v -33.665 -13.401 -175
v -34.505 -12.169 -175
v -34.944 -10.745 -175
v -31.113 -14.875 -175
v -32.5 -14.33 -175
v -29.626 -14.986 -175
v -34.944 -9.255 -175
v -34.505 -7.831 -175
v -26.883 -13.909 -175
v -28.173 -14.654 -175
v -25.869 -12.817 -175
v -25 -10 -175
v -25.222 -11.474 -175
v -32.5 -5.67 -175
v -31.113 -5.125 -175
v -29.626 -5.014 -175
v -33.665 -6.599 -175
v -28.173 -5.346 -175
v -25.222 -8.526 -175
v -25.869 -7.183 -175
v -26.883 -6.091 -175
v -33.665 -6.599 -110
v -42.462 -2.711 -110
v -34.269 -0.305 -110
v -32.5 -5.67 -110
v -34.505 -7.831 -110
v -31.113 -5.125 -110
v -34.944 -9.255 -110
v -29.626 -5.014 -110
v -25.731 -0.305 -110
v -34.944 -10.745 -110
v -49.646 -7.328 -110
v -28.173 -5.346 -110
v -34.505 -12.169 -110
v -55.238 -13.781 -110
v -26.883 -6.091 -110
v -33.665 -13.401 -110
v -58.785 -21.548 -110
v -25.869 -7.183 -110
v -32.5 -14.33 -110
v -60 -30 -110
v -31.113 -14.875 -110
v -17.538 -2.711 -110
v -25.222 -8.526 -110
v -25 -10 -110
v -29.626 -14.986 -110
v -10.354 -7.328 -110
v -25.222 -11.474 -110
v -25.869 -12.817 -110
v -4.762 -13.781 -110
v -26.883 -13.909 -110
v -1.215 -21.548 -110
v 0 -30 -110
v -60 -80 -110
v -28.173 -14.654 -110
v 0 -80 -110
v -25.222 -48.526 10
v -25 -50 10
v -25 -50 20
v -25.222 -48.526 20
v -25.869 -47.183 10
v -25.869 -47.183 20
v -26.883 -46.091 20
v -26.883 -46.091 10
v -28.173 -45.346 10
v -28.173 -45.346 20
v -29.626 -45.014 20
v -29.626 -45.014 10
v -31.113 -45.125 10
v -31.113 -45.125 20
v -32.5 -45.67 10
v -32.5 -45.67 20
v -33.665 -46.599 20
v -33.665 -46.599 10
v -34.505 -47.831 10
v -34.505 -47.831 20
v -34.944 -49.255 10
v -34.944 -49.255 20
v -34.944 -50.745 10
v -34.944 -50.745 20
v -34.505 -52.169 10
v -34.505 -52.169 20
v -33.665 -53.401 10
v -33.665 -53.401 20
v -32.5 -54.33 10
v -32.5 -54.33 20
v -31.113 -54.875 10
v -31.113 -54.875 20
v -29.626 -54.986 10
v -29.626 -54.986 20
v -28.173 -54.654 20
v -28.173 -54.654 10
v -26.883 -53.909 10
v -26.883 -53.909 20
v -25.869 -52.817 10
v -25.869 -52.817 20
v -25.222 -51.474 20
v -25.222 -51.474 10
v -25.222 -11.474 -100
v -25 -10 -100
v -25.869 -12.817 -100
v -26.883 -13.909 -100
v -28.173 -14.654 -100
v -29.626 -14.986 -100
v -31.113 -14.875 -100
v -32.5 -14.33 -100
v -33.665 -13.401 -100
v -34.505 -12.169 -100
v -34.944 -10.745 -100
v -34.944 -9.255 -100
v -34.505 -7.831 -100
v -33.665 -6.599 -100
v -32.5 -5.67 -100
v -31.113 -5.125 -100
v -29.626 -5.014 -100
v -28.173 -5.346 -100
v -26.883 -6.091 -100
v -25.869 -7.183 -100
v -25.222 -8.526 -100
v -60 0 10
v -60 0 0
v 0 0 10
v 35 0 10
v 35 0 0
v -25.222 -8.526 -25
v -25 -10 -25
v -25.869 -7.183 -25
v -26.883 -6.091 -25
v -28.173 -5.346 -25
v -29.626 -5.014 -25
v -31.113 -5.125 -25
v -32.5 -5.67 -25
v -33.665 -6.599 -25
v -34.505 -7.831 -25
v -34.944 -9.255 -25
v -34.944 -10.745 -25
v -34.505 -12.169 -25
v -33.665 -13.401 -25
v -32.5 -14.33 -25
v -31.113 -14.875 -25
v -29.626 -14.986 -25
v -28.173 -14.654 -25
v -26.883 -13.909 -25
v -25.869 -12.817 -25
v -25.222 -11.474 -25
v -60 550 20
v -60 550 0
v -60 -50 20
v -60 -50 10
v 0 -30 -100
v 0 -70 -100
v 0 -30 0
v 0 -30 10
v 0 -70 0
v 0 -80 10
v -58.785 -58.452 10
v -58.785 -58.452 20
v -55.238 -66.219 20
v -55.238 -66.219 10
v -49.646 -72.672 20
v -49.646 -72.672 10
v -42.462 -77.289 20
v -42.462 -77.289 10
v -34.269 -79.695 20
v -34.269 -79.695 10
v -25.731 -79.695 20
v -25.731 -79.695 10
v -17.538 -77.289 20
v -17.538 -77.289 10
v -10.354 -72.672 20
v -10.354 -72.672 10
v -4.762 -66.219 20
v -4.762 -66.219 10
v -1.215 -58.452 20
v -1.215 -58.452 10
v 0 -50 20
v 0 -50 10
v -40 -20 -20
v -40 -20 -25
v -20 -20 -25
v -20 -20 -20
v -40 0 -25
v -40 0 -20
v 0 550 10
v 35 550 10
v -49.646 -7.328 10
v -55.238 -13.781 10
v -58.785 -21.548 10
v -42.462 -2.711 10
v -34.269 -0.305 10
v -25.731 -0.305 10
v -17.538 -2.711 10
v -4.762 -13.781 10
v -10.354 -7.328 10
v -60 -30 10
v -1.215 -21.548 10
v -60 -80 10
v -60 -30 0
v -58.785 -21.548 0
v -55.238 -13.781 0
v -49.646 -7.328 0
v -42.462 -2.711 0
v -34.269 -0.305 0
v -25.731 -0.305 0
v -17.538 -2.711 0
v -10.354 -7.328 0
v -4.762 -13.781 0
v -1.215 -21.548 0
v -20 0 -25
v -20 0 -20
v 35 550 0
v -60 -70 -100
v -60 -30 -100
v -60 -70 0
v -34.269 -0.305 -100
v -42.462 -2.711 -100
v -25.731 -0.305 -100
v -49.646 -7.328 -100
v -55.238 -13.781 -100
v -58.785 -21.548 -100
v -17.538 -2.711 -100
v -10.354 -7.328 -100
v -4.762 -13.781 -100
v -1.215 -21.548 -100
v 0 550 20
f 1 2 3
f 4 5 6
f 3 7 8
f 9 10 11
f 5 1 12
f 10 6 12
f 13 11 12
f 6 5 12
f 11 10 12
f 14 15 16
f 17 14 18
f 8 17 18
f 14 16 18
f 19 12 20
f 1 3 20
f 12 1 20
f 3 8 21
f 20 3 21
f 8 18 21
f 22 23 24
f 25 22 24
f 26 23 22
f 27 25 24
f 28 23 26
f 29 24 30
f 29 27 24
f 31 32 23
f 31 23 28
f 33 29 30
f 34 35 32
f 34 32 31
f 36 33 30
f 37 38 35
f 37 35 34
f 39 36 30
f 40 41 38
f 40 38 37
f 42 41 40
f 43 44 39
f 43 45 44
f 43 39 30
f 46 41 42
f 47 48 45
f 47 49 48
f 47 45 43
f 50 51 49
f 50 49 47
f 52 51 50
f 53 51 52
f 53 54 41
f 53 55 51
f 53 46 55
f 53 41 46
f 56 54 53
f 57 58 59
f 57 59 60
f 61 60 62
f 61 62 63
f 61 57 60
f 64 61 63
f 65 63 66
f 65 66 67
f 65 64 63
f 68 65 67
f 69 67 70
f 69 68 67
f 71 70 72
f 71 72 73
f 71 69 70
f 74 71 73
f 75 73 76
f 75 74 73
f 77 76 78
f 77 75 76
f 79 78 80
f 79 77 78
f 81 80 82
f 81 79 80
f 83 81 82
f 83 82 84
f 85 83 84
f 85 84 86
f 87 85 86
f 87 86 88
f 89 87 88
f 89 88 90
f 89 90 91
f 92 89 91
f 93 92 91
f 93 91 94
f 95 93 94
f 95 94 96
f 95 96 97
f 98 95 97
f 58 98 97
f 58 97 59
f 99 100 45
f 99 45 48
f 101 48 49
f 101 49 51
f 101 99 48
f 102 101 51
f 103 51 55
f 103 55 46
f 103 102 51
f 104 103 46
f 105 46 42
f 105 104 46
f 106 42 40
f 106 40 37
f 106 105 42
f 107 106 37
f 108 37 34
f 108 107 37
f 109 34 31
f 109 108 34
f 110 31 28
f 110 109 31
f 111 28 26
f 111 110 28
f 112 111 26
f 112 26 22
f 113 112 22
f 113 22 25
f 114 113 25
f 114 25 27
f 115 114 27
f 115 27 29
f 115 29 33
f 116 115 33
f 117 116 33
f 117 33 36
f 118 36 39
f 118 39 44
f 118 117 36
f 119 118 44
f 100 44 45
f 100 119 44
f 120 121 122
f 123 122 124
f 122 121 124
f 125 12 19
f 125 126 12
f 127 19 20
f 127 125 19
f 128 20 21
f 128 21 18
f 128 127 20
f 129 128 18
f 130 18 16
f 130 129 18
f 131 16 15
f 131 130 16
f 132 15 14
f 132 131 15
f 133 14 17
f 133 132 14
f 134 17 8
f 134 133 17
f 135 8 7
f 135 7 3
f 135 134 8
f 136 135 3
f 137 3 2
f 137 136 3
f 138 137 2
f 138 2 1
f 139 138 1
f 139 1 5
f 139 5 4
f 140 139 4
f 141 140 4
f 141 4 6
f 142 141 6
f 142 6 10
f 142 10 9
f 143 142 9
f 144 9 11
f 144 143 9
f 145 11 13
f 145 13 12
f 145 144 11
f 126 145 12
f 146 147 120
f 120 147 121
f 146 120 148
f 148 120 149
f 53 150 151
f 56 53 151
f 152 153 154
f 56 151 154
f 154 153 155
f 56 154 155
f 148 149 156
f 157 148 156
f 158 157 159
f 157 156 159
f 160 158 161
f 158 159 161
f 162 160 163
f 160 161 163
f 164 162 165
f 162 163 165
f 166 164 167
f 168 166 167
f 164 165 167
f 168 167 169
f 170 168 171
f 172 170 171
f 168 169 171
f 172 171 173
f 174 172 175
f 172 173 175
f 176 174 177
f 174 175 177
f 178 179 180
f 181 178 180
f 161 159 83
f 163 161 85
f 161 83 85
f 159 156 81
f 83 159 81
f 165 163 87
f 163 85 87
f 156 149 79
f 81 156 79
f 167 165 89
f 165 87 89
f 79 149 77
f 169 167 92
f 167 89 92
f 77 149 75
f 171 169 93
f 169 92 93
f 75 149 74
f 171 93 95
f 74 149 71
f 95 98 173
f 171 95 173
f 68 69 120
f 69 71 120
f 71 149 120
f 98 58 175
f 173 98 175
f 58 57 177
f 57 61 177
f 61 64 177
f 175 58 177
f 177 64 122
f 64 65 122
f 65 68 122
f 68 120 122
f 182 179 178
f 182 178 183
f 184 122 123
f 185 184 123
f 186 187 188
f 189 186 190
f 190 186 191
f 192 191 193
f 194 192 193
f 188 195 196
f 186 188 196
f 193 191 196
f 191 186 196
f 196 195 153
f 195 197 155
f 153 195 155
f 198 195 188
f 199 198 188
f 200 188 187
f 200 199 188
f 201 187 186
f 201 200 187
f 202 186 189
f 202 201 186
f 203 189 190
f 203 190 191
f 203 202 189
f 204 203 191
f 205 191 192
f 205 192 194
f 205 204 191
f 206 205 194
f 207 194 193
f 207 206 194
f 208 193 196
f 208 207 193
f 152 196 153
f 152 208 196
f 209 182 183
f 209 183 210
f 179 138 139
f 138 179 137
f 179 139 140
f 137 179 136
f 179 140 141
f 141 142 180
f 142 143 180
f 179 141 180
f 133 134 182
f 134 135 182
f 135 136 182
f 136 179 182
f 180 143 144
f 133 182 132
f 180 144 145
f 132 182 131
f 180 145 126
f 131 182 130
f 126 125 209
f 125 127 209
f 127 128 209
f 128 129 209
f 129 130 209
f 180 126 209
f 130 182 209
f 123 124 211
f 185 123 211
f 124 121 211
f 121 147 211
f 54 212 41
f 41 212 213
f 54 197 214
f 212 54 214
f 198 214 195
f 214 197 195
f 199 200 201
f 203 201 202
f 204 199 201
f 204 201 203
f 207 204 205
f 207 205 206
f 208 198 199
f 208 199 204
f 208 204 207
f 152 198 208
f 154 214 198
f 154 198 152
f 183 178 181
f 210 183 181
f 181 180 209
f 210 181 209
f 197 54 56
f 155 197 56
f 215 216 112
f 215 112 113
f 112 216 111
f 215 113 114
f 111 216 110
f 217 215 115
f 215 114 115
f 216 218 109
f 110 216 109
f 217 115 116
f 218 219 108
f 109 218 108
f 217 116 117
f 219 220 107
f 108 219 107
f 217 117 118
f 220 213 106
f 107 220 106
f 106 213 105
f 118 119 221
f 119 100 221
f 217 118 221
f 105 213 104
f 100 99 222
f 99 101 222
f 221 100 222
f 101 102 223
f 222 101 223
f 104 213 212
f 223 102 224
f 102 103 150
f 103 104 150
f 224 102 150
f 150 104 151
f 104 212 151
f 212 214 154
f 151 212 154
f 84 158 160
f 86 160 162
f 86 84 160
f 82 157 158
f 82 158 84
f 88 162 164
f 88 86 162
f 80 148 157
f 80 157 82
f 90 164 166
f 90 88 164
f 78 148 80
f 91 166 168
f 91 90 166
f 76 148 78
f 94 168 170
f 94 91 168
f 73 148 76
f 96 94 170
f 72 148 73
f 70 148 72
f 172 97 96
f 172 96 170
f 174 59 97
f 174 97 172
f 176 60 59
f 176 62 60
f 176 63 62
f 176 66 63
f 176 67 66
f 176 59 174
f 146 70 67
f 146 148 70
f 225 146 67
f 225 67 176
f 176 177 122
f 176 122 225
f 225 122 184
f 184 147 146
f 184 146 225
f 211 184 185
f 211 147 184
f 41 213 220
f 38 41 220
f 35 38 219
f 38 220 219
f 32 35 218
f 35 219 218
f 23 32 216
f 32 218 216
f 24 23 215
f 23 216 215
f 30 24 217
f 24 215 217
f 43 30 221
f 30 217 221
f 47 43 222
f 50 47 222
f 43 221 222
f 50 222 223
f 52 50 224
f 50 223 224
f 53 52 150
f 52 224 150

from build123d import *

# Parameters (mm, degrees)
F1_W           = 60
F1_H           = 550
F2_DEPTH       = 20
F1_W_2         = 35
F3_DEPTH       = 10
F1_R           = 5
F4_DEPTH       = 20
F5_DEPTH       = 10
F6_W           = 60
F6_H           = 10
F7_DEPTH       = 10
F8_DEPTH       = 100
F9_R           = 5
F9_W           = 60
F9_H           = 10
F10_DEPTH      = 10
F11_R          = 5
F12_DEPTH      = 75
F12_DEPTH_BACK = 75
F13_W          = 20.000001848
F13_H          = 20.000001848
F13_R          = 5
F14_DEPTH      = 5


with BuildPart() as f2:
    # F1 (on Top) → F2 (new body)
    with BuildSketch(Plane.XY):
        with Locations((-30, 275)):
            Rectangle(F1_W, F1_H)
    extrude(amount=F2_DEPTH)

    # F1 (on Top) → F3 (join)
    with BuildSketch(Plane.XY):
        with Locations((17.5, 275)):
            Rectangle(F1_W_2, F1_H)
    extrude(amount=F3_DEPTH)

    # F1 (on Top) → F4 (join)
    with BuildSketch(Plane.XY):
        with BuildLine():
            Line((0, -50), (0, 0))
            Line((0, 0), (-60, 0))
            Line((-60, 0), (-60, -50))
            ThreePointArc((-60, -50), (-30, -80), (0, -50))
        make_face()
        with Locations((-30, -50)):
            Circle(F1_R, mode=Mode.SUBTRACT)
    extrude(amount=F4_DEPTH)

    # F1 (on Top) → F5 (cut)
    with BuildSketch(Plane.XY):
        with BuildLine():
            Line((0, -50), (0, 0))
            Line((0, 0), (-60, 0))
            Line((-60, 0), (-60, -50))
            ThreePointArc((-60, -50), (-30, -80), (0, -50))
        make_face()
        with Locations((-30, -50)):
            Circle(F1_R, mode=Mode.SUBTRACT)
    extrude(amount=F5_DEPTH, mode=Mode.SUBTRACT)


with BuildPart() as f7:
    # F6 (on face) → F7 (new body)
    with BuildSketch(Plane(origin=(0, 0, 0), x_dir=(1, 0, 0), z_dir=(0, 0, -1))):
        with Locations((-30, 75)):
            Rectangle(F6_W, F6_H)
        with BuildLine():
            Line((-60, 70), (-60, 30))
            ThreePointArc((-60, 30), (-51.2132034519, 8.7867965807), (-30.0000000462, 0))
            ThreePointArc((-30.0000000462, 0), (-8.7867965807, 8.7867965481), (0, 30))
            Line((0, 30), (0, 70))
            Line((0, 70), (-60, 70))
        make_face()
    extrude(amount=-F7_DEPTH)

    # F6 (on face) → F8 (join)
    with BuildSketch(Plane(origin=(0, 0, 0), x_dir=(1, 0, 0), z_dir=(0, 0, -1))):
        with Locations((-30, 75)):
            Rectangle(F6_W, F6_H)
    extrude(amount=F8_DEPTH)

    # F9 (on face) → F10 (join)
    with BuildSketch(Plane(origin=(0, 0, -100), x_dir=(1, 0, 0), z_dir=(0, 0, -1))):
        with BuildLine():
            Line((0, 70), (-60, 70))
            Line((-60, 70), (-60, 30))
            ThreePointArc((-60, 30), (-51.2132034356, 8.7867965644), (-30, 0))
            ThreePointArc((-30, 0), (-8.7867965644, 8.7867965644), (0, 30))
            Line((0, 30), (0, 70))
        make_face()
        with Locations((-30, 10)):
            Circle(F9_R, mode=Mode.SUBTRACT)
        with Locations((-30, 75)):
            Rectangle(F9_W, F9_H)
    extrude(amount=F10_DEPTH)


with BuildPart() as f12:
    # F11 (on face) → F12 (new body, two sides)
    with BuildSketch(Plane.XY.offset(-100)) as f12_sk:
        with Locations((-29.9999999688, -10)):
            Circle(F11_R)
    extrude(amount=F12_DEPTH)
    extrude(f12_sk.sketch, amount=-F12_DEPTH_BACK)

    # F13 (on face) → F14 (join)
    with BuildSketch(Plane.XY.offset(-25)):
        with Locations((-30, -10.000000924)):
            Rectangle(F13_W, F13_H)
        with Locations((-29.9999999688, -10)):
            Circle(F13_R, mode=Mode.SUBTRACT)
        with Locations((-30, -10.000000924)):
            Rectangle(F13_W, F13_H)
    extrude(amount=F14_DEPTH)


solid = Compound([f2.part, f7.part, f12.part])
